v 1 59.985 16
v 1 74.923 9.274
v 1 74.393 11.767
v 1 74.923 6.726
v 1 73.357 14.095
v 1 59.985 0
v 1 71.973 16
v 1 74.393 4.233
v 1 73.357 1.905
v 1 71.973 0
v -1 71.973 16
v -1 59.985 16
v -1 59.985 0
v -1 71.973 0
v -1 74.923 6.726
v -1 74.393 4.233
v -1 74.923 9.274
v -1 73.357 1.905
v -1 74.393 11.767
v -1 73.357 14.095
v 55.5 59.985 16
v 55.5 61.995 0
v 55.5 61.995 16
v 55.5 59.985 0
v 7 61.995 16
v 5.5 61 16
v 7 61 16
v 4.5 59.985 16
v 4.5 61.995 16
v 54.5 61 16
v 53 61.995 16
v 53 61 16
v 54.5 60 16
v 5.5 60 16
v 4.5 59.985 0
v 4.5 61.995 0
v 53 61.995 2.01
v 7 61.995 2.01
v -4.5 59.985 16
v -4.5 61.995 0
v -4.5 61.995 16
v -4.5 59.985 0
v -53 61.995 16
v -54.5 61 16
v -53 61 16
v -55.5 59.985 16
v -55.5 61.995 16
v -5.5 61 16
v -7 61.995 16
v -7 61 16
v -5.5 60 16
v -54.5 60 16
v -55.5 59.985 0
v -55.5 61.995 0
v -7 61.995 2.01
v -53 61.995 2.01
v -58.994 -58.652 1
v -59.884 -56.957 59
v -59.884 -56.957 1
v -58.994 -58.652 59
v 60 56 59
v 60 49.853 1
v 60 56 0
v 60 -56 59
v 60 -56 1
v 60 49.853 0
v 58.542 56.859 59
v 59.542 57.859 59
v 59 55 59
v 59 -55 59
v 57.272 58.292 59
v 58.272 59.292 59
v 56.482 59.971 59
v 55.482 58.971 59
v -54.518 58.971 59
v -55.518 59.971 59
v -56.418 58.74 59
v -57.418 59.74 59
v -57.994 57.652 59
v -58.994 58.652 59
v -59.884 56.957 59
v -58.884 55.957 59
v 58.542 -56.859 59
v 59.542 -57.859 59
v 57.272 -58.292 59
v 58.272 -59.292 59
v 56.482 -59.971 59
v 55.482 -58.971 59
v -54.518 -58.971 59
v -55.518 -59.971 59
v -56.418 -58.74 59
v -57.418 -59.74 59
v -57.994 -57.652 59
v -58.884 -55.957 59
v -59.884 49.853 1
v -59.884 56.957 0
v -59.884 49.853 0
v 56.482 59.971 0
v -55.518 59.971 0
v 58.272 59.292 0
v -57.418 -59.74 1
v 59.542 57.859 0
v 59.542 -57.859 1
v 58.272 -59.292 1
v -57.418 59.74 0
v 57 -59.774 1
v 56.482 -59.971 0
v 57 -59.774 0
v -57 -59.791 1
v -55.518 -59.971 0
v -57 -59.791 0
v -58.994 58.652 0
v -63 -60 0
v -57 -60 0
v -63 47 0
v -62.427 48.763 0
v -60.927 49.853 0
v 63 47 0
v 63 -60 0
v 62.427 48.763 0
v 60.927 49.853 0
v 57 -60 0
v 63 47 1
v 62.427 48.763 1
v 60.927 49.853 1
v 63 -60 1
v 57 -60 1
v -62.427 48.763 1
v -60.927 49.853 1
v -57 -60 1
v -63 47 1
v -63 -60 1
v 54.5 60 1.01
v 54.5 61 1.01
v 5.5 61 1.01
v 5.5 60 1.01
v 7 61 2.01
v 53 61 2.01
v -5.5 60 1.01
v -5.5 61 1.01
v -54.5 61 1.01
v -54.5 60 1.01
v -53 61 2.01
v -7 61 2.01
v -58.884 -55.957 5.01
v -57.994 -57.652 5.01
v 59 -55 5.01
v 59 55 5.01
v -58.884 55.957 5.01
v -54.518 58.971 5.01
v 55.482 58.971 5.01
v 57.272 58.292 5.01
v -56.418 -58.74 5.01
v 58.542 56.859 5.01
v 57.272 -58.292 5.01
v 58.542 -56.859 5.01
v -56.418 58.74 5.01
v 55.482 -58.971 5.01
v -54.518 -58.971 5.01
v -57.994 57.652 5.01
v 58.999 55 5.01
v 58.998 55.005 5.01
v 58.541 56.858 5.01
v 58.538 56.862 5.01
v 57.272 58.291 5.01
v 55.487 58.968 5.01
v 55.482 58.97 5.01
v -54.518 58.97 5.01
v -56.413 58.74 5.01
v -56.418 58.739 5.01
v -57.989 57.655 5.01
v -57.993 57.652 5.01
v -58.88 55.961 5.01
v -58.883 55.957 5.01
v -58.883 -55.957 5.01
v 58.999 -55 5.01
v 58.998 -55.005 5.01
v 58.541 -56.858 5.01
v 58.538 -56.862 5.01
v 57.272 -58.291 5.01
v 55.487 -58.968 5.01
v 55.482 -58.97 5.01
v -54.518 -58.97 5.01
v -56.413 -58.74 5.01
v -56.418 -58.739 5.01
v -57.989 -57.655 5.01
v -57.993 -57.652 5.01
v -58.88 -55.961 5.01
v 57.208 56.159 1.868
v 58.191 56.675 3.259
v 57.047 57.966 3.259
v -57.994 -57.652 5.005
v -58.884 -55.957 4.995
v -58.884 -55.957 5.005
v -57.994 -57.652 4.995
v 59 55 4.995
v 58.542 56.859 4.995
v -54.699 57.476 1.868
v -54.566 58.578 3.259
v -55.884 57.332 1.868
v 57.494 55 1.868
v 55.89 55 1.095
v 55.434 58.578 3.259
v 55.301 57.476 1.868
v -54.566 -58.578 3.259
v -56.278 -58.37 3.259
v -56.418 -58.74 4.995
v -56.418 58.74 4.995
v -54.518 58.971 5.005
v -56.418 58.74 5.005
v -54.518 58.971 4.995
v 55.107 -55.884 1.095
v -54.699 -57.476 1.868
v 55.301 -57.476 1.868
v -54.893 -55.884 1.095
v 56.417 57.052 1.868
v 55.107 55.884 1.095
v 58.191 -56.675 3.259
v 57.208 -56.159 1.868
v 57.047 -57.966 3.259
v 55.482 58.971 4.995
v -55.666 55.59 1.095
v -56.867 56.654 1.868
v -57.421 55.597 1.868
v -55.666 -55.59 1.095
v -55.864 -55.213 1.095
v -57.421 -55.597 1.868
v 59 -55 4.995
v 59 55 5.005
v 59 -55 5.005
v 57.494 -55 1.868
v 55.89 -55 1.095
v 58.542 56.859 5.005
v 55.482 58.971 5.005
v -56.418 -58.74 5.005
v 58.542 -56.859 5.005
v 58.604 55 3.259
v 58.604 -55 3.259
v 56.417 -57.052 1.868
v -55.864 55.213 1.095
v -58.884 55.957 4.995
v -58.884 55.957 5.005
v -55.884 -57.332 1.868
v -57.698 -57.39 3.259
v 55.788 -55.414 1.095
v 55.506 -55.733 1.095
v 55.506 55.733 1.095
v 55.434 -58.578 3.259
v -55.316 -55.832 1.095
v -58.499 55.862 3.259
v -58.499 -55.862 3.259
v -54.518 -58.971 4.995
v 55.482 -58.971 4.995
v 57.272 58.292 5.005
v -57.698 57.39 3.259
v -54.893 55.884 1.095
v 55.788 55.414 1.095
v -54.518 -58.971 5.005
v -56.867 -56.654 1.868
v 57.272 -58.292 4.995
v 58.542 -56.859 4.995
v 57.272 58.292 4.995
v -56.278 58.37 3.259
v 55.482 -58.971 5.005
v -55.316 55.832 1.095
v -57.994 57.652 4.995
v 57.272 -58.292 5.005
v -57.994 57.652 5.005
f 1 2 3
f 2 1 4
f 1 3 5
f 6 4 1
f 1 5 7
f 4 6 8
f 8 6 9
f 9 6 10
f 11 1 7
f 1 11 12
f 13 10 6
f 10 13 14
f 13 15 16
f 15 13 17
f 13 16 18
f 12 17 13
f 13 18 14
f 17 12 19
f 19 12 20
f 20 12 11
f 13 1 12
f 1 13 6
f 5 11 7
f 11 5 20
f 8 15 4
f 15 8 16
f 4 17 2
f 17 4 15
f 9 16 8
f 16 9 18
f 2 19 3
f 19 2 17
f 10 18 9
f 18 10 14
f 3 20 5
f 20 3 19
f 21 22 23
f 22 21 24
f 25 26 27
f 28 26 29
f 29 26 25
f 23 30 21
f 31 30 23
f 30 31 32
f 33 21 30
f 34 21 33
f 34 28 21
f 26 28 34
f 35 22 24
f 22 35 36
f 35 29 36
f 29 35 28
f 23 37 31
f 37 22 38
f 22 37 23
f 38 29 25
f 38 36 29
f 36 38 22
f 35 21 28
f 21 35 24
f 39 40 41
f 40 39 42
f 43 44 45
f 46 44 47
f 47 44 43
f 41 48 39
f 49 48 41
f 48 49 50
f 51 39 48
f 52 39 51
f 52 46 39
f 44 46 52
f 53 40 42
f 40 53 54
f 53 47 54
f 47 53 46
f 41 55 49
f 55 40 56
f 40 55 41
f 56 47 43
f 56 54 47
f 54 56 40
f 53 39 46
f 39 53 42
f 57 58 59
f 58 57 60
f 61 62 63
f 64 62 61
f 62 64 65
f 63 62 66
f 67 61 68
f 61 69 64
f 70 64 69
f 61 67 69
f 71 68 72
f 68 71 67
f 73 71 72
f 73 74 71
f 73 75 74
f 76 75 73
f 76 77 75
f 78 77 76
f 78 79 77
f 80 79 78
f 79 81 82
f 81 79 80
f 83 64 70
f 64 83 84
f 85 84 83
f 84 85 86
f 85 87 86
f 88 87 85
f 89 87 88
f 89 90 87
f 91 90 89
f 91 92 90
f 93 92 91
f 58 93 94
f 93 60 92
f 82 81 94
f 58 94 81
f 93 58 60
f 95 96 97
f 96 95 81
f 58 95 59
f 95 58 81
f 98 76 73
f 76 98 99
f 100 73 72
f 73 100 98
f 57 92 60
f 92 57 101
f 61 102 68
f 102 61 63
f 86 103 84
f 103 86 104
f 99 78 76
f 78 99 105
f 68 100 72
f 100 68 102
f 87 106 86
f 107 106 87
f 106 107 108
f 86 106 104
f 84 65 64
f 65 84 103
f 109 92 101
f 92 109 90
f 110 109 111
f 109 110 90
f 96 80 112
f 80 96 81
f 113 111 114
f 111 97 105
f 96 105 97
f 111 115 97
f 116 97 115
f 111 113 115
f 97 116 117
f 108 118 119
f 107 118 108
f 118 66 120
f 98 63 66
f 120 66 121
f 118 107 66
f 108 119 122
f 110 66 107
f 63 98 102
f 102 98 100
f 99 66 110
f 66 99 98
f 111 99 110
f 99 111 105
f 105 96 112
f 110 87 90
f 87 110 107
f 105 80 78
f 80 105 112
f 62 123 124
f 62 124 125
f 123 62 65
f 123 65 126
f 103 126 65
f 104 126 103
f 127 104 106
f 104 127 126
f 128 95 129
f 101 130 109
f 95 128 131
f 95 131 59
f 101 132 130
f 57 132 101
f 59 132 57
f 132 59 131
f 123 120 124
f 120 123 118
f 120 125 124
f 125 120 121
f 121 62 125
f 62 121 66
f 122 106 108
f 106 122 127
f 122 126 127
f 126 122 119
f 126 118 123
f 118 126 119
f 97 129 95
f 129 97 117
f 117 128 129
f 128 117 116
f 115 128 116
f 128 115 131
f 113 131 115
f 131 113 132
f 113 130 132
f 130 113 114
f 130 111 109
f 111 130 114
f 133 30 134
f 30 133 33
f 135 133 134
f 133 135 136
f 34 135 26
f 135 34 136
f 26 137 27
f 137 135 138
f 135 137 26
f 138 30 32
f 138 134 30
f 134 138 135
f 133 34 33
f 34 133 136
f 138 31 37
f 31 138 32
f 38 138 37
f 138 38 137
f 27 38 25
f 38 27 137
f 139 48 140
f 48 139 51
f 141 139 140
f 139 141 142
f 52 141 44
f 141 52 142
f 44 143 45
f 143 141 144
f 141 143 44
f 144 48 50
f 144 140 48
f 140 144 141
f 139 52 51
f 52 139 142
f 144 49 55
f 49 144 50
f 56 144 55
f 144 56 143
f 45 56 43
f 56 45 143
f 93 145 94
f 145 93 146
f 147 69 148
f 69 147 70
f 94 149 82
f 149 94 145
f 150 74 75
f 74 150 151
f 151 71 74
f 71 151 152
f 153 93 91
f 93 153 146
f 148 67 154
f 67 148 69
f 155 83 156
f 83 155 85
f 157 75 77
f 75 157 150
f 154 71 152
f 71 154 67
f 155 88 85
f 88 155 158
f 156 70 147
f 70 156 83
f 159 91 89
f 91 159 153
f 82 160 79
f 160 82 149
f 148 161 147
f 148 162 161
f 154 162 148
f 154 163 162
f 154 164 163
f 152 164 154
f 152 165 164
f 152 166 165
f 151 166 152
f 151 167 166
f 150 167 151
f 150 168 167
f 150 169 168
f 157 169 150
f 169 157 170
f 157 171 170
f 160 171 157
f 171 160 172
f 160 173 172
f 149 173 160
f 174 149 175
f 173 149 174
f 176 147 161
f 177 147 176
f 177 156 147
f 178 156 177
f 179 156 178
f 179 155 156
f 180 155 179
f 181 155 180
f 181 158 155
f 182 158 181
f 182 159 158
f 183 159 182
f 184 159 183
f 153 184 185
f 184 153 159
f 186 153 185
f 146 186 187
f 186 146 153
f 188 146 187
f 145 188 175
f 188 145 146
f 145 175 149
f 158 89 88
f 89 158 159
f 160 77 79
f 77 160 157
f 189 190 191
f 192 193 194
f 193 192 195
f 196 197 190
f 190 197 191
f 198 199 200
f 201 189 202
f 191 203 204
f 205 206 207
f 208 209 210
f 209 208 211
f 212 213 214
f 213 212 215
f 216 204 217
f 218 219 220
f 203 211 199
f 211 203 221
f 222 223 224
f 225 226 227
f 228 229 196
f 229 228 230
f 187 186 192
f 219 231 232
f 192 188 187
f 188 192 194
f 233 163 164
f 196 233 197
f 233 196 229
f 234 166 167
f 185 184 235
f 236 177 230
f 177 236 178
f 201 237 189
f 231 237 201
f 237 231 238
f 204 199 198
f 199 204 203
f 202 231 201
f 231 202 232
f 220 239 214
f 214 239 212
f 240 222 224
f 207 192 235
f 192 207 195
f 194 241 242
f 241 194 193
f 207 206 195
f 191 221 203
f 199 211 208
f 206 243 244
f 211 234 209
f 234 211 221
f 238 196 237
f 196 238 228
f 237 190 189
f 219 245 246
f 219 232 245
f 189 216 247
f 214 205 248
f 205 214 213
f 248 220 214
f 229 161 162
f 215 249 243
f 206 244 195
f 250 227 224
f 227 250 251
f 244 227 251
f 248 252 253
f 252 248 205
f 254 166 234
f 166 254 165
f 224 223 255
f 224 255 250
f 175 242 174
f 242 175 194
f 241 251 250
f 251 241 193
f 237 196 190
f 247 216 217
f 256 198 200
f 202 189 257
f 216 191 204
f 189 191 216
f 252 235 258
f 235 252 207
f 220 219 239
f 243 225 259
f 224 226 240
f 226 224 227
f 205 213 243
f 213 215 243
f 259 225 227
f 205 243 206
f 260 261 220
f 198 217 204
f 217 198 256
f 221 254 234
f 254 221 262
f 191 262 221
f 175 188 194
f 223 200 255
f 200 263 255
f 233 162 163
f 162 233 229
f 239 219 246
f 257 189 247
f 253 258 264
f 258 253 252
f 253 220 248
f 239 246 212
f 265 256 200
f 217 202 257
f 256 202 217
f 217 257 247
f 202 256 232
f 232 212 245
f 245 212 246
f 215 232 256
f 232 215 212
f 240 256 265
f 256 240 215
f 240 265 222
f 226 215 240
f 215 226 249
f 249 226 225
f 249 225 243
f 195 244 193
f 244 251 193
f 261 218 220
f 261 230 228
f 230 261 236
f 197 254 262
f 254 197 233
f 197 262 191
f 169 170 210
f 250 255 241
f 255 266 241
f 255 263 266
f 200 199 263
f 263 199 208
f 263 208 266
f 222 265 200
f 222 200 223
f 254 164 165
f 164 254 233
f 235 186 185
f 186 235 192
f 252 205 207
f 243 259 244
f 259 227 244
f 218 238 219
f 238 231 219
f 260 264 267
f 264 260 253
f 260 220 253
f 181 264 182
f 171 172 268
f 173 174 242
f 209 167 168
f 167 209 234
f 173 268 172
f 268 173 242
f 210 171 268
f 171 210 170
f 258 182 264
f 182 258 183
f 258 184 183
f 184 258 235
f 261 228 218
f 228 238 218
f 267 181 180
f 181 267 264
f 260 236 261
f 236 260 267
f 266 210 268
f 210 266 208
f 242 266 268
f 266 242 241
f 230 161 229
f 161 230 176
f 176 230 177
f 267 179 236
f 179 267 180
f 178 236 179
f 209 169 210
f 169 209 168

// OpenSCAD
// Customizable Ultimate Drawer System Drawer
// Remixed from MarcElbichon's Ultimate Drawer System https://www.thingiverse.com/thing:2302575 (CC-BY 4.0)
// Copyright (C) 2019 by Brian Alano (and possibly others)
// Licensed under the Creative Commons Attribution-NonCommercial-ShareAlike 4.0 (CC-BY-NC-SA 4.0)

/* Design notes
// width is x dimension, across the face of the drawer
// depth is y dimension, front to back of the drawer
// height is z dimension
*/

/* Coding Style Guide 
 * User parameters and modules use underscores between words.
 * Other variable names use camel case.
 * Separate features into their own modules if they are more than a couple lines long.
 * All dimensions should be assigned to variables, usually global ones so they can be found easily.
 * Keep local modules local.
 * Keep local variables local.
 * Maintain Thingiverse Customizer compatibility.
 * Maintain backwards compatibility with MarcElbichon's Ultimate Drawer System 
   (https://www.thingiverse.com/thing:2302575). This means a 1Ux1Ux1U drawer 
   made with this program will work in MarcElbichon's shelf. 
*/

/* [Size] */
// units wide (actual drawer width is 131*U_wide - 10)
U_wide=1; // [1, 1.5]
// units deep (actual drawer depth is 130*U_deep - 10)
U_deep=1; // [1, 1.5]
// units high (actual drawer height is 20*U_high - 1)
U_high=3; // [1:15]

/* [Features] */
// What kind of drawer pull?
pull_style = "original"; // [original, ergonomic]
// modify the flange to allow for the drawer catch on the shelf?
drawer_catch = "no"; // [yes, no]
// include slots on the back of the drawer for the locking mechanism
rear_lock_slot = "no"; // [yes, no]

/* [Hidden] */
drawerUnit=[120, 120, 19];
shelfPadding=[11, 10, 1];

wallThickness = 1;
shelfUnit = [131, 130, 30];
shelf = [shelfUnit.x * U_wide, shelfUnit.y * U_deep, (shelfUnit.z - wallThickness*2) * U_high - wallThickness*2]; // reference dimension from shelf .scad file.
drawer = [shelf.x - shelfPadding.x, shelf.y - shelfPadding.y, shelf.z - shelfPadding.z];

cornerR = 4;
cornerD = cornerR * 2;
flangeR = 3;
flangeD = flangeR * 2;
flange = [3, d_to_y(U_deep)-10, 1];
pullD = 24.38;
pull = [2, pullD/2 + 2.8, 16];
label = [51, 2, 16];
labelSlot = [49, 1, 15];
labelWindow = [46, 1, 14];
catch = [flange.x * 0.4, d_to_y(U_deep) - 4, flange.z];
rearLockSlot = [26, 3.5, 8];

// utility variables
epsilon = 0.01;

// the spacing between drawings is 20, or drawerUnit.z + 1. so a 1U drawer is 19, a 2U drawer is 39, etc.
//FIXME replace with drawer[]
//FIXME put lock on bottom, not top.
function u_to_z(u) = (drawerUnit.z + shelfPadding.z) * u - shelfPadding.z;
function w_to_x(w) = (drawerUnit.x + shelfPadding.x) * w - shelfPadding.x;
function d_to_y(d) = (drawerUnit.y + shelfPadding.y) * d - shelfPadding.y;

module drawer() {
    module add() {
        // main body
        linear_extrude(u_to_z(U_high))
            roundtangle(width=w_to_x(U_wide), length=d_to_y(U_deep), radius=cornerR);
        // flanges
        linear_extrude(flange.z) 
            for (i = [1, -1]) {
                translate([w_to_x(U_wide)/2*i, -d_to_y(U_deep)/2] ) {
                    translate([-flange.x, 0]) square([flange.x*2, flange.y - flangeR]);
                    translate([0, flange.y - flangeR]) circle(r=flangeR);
                }
            }
        // pull
        translate([0, d_to_y(U_deep)/2, pull.z/2]) pull(style=pull_style);
        // label holders (positive part)
        for (i = [1, -1]) {
            translate([w_to_x(U_wide)/4*i, (d_to_y(U_deep) + label.y)/2 - epsilon, label.z/2]) cube([label.x, label.y + epsilon, label.z], center=true);
        }
        // rear lock pockets
        if (rear_lock_slot == "yes")
            for(j = [1:U_high])
                translate([0, -d_to_y(U_deep)/2, u_to_z(j)]) 
                    rearLockSlot();
    }
    
    module subtract() {
        // main cut, minus fillets
        cut = [w_to_x(U_wide) - wallThickness*2, d_to_y(U_deep) - wallThickness*2, u_to_z(U_high) - wallThickness - cornerR];
        translate([0, 0, u_to_z(U_high) - cut.z + epsilon]) 
            linear_extrude(cut.z + epsilon) roundtangle(cut.x, cut.y, cornerR);
        // fillet cut
       translate([0, 0, u_to_z(U_high) - cut.z]) 
            minkowski() {
                cube([cut.x - cornerD, cut.y - cornerD, epsilon], center=true);
                sphere(d=cornerD);
            }
        for (i=[1, -1]) {
            // label cuts
            translate([w_to_x(U_wide)/4*i, d_to_y(U_deep)/2 + labelSlot.y/2, labelSlot.z/2 + (label.z - labelSlot.z) + epsilon])
                cube(labelSlot, center=true);
            translate([w_to_x(U_wide)/4*i, d_to_y(U_deep)/2 + label.y - wallThickness/2, labelWindow.z/2 + (label.z - labelWindow.z) + epsilon])
                cube(labelWindow, center=true);
            // drawer catch cutout
            if (drawer_catch == "yes") {
               translate([(w_to_x(U_wide)/2 + flange.x - catch.x/2 + epsilon)*i, 
                d_to_y(U_deep)/2 - catch.y/2, 
                catch.z/2 - epsilon])
                    cube([catch.x + epsilon, catch.y, catch.z + 2*epsilon], center=true);
            }
        }
    }
     
    difference() {
        add();  
        subtract();
    }
}

module pull(style) {
    // drawer pull
    module original() {
        intersection() {
           translate([0, pull.y/2 - epsilon]) cube([pull.x, pull.y + epsilon, pull.z], center = true);
           translate([0, pull.y - pullD/2]) rotate([0, 90, 0]) cylinder(d=pullD, h=pull.x, center = true);
        }
    }

    module ergonomic() {
        difference() {
            original();
            translate([0, pull.y - pullD/2]) rotate([0, 90, 0]) {
                intersection() {
                    cylinder(d=pullD/2, h=pull.x+epsilon*4, center = true);
                    translate([0, pullD/3]) cylinder(d=pullD/2, h=pull.x+epsilon*4, center = true);
                }
            }
        }
        scale([3, 1, 1]) difference() {
            original();
            translate([0, pull.y - pullD/2]) rotate([0, 90, 0]) cylinder(d=pullD-pull.x*2, h=pull.x+epsilon*2, center = true);
        }
    }

    if (style == "original") original();
    if (style == "ergonomic") ergonomic();
}

module rearLockSlot() {    
    module half() {
        translate([rearLockSlot.x/2, -rearLockSlot.y, -drawerUnit.z + rearLockSlot.z/2]) 
        {
            cube([wallThickness, rearLockSlot.y, rearLockSlot.z/2]);
            rotate([0, 90, 0])
                linear_extrude(wallThickness) 
                polygon([[0, 0], [rearLockSlot.y, rearLockSlot.y], [0, rearLockSlot.y]]);
        }
        translate([0, -rearLockSlot.y, -drawerUnit.z + rearLockSlot.z/2]) 
            cube([rearLockSlot.x/2, wallThickness, rearLockSlot.z/2]);
    }
    
    module add() {
        for(i=[0, 1]) 
            mirror([i, 0, 0]) half();
    }
    add();
//    half();
}

module roundtangle(width, length, radius) {
    minkowski() {
                square([width - radius*2, length - radius*2], center=true);
                circle(r=radius);
            }
}
drawer();
//pull(style="ergonomic");
//rear_lock();
